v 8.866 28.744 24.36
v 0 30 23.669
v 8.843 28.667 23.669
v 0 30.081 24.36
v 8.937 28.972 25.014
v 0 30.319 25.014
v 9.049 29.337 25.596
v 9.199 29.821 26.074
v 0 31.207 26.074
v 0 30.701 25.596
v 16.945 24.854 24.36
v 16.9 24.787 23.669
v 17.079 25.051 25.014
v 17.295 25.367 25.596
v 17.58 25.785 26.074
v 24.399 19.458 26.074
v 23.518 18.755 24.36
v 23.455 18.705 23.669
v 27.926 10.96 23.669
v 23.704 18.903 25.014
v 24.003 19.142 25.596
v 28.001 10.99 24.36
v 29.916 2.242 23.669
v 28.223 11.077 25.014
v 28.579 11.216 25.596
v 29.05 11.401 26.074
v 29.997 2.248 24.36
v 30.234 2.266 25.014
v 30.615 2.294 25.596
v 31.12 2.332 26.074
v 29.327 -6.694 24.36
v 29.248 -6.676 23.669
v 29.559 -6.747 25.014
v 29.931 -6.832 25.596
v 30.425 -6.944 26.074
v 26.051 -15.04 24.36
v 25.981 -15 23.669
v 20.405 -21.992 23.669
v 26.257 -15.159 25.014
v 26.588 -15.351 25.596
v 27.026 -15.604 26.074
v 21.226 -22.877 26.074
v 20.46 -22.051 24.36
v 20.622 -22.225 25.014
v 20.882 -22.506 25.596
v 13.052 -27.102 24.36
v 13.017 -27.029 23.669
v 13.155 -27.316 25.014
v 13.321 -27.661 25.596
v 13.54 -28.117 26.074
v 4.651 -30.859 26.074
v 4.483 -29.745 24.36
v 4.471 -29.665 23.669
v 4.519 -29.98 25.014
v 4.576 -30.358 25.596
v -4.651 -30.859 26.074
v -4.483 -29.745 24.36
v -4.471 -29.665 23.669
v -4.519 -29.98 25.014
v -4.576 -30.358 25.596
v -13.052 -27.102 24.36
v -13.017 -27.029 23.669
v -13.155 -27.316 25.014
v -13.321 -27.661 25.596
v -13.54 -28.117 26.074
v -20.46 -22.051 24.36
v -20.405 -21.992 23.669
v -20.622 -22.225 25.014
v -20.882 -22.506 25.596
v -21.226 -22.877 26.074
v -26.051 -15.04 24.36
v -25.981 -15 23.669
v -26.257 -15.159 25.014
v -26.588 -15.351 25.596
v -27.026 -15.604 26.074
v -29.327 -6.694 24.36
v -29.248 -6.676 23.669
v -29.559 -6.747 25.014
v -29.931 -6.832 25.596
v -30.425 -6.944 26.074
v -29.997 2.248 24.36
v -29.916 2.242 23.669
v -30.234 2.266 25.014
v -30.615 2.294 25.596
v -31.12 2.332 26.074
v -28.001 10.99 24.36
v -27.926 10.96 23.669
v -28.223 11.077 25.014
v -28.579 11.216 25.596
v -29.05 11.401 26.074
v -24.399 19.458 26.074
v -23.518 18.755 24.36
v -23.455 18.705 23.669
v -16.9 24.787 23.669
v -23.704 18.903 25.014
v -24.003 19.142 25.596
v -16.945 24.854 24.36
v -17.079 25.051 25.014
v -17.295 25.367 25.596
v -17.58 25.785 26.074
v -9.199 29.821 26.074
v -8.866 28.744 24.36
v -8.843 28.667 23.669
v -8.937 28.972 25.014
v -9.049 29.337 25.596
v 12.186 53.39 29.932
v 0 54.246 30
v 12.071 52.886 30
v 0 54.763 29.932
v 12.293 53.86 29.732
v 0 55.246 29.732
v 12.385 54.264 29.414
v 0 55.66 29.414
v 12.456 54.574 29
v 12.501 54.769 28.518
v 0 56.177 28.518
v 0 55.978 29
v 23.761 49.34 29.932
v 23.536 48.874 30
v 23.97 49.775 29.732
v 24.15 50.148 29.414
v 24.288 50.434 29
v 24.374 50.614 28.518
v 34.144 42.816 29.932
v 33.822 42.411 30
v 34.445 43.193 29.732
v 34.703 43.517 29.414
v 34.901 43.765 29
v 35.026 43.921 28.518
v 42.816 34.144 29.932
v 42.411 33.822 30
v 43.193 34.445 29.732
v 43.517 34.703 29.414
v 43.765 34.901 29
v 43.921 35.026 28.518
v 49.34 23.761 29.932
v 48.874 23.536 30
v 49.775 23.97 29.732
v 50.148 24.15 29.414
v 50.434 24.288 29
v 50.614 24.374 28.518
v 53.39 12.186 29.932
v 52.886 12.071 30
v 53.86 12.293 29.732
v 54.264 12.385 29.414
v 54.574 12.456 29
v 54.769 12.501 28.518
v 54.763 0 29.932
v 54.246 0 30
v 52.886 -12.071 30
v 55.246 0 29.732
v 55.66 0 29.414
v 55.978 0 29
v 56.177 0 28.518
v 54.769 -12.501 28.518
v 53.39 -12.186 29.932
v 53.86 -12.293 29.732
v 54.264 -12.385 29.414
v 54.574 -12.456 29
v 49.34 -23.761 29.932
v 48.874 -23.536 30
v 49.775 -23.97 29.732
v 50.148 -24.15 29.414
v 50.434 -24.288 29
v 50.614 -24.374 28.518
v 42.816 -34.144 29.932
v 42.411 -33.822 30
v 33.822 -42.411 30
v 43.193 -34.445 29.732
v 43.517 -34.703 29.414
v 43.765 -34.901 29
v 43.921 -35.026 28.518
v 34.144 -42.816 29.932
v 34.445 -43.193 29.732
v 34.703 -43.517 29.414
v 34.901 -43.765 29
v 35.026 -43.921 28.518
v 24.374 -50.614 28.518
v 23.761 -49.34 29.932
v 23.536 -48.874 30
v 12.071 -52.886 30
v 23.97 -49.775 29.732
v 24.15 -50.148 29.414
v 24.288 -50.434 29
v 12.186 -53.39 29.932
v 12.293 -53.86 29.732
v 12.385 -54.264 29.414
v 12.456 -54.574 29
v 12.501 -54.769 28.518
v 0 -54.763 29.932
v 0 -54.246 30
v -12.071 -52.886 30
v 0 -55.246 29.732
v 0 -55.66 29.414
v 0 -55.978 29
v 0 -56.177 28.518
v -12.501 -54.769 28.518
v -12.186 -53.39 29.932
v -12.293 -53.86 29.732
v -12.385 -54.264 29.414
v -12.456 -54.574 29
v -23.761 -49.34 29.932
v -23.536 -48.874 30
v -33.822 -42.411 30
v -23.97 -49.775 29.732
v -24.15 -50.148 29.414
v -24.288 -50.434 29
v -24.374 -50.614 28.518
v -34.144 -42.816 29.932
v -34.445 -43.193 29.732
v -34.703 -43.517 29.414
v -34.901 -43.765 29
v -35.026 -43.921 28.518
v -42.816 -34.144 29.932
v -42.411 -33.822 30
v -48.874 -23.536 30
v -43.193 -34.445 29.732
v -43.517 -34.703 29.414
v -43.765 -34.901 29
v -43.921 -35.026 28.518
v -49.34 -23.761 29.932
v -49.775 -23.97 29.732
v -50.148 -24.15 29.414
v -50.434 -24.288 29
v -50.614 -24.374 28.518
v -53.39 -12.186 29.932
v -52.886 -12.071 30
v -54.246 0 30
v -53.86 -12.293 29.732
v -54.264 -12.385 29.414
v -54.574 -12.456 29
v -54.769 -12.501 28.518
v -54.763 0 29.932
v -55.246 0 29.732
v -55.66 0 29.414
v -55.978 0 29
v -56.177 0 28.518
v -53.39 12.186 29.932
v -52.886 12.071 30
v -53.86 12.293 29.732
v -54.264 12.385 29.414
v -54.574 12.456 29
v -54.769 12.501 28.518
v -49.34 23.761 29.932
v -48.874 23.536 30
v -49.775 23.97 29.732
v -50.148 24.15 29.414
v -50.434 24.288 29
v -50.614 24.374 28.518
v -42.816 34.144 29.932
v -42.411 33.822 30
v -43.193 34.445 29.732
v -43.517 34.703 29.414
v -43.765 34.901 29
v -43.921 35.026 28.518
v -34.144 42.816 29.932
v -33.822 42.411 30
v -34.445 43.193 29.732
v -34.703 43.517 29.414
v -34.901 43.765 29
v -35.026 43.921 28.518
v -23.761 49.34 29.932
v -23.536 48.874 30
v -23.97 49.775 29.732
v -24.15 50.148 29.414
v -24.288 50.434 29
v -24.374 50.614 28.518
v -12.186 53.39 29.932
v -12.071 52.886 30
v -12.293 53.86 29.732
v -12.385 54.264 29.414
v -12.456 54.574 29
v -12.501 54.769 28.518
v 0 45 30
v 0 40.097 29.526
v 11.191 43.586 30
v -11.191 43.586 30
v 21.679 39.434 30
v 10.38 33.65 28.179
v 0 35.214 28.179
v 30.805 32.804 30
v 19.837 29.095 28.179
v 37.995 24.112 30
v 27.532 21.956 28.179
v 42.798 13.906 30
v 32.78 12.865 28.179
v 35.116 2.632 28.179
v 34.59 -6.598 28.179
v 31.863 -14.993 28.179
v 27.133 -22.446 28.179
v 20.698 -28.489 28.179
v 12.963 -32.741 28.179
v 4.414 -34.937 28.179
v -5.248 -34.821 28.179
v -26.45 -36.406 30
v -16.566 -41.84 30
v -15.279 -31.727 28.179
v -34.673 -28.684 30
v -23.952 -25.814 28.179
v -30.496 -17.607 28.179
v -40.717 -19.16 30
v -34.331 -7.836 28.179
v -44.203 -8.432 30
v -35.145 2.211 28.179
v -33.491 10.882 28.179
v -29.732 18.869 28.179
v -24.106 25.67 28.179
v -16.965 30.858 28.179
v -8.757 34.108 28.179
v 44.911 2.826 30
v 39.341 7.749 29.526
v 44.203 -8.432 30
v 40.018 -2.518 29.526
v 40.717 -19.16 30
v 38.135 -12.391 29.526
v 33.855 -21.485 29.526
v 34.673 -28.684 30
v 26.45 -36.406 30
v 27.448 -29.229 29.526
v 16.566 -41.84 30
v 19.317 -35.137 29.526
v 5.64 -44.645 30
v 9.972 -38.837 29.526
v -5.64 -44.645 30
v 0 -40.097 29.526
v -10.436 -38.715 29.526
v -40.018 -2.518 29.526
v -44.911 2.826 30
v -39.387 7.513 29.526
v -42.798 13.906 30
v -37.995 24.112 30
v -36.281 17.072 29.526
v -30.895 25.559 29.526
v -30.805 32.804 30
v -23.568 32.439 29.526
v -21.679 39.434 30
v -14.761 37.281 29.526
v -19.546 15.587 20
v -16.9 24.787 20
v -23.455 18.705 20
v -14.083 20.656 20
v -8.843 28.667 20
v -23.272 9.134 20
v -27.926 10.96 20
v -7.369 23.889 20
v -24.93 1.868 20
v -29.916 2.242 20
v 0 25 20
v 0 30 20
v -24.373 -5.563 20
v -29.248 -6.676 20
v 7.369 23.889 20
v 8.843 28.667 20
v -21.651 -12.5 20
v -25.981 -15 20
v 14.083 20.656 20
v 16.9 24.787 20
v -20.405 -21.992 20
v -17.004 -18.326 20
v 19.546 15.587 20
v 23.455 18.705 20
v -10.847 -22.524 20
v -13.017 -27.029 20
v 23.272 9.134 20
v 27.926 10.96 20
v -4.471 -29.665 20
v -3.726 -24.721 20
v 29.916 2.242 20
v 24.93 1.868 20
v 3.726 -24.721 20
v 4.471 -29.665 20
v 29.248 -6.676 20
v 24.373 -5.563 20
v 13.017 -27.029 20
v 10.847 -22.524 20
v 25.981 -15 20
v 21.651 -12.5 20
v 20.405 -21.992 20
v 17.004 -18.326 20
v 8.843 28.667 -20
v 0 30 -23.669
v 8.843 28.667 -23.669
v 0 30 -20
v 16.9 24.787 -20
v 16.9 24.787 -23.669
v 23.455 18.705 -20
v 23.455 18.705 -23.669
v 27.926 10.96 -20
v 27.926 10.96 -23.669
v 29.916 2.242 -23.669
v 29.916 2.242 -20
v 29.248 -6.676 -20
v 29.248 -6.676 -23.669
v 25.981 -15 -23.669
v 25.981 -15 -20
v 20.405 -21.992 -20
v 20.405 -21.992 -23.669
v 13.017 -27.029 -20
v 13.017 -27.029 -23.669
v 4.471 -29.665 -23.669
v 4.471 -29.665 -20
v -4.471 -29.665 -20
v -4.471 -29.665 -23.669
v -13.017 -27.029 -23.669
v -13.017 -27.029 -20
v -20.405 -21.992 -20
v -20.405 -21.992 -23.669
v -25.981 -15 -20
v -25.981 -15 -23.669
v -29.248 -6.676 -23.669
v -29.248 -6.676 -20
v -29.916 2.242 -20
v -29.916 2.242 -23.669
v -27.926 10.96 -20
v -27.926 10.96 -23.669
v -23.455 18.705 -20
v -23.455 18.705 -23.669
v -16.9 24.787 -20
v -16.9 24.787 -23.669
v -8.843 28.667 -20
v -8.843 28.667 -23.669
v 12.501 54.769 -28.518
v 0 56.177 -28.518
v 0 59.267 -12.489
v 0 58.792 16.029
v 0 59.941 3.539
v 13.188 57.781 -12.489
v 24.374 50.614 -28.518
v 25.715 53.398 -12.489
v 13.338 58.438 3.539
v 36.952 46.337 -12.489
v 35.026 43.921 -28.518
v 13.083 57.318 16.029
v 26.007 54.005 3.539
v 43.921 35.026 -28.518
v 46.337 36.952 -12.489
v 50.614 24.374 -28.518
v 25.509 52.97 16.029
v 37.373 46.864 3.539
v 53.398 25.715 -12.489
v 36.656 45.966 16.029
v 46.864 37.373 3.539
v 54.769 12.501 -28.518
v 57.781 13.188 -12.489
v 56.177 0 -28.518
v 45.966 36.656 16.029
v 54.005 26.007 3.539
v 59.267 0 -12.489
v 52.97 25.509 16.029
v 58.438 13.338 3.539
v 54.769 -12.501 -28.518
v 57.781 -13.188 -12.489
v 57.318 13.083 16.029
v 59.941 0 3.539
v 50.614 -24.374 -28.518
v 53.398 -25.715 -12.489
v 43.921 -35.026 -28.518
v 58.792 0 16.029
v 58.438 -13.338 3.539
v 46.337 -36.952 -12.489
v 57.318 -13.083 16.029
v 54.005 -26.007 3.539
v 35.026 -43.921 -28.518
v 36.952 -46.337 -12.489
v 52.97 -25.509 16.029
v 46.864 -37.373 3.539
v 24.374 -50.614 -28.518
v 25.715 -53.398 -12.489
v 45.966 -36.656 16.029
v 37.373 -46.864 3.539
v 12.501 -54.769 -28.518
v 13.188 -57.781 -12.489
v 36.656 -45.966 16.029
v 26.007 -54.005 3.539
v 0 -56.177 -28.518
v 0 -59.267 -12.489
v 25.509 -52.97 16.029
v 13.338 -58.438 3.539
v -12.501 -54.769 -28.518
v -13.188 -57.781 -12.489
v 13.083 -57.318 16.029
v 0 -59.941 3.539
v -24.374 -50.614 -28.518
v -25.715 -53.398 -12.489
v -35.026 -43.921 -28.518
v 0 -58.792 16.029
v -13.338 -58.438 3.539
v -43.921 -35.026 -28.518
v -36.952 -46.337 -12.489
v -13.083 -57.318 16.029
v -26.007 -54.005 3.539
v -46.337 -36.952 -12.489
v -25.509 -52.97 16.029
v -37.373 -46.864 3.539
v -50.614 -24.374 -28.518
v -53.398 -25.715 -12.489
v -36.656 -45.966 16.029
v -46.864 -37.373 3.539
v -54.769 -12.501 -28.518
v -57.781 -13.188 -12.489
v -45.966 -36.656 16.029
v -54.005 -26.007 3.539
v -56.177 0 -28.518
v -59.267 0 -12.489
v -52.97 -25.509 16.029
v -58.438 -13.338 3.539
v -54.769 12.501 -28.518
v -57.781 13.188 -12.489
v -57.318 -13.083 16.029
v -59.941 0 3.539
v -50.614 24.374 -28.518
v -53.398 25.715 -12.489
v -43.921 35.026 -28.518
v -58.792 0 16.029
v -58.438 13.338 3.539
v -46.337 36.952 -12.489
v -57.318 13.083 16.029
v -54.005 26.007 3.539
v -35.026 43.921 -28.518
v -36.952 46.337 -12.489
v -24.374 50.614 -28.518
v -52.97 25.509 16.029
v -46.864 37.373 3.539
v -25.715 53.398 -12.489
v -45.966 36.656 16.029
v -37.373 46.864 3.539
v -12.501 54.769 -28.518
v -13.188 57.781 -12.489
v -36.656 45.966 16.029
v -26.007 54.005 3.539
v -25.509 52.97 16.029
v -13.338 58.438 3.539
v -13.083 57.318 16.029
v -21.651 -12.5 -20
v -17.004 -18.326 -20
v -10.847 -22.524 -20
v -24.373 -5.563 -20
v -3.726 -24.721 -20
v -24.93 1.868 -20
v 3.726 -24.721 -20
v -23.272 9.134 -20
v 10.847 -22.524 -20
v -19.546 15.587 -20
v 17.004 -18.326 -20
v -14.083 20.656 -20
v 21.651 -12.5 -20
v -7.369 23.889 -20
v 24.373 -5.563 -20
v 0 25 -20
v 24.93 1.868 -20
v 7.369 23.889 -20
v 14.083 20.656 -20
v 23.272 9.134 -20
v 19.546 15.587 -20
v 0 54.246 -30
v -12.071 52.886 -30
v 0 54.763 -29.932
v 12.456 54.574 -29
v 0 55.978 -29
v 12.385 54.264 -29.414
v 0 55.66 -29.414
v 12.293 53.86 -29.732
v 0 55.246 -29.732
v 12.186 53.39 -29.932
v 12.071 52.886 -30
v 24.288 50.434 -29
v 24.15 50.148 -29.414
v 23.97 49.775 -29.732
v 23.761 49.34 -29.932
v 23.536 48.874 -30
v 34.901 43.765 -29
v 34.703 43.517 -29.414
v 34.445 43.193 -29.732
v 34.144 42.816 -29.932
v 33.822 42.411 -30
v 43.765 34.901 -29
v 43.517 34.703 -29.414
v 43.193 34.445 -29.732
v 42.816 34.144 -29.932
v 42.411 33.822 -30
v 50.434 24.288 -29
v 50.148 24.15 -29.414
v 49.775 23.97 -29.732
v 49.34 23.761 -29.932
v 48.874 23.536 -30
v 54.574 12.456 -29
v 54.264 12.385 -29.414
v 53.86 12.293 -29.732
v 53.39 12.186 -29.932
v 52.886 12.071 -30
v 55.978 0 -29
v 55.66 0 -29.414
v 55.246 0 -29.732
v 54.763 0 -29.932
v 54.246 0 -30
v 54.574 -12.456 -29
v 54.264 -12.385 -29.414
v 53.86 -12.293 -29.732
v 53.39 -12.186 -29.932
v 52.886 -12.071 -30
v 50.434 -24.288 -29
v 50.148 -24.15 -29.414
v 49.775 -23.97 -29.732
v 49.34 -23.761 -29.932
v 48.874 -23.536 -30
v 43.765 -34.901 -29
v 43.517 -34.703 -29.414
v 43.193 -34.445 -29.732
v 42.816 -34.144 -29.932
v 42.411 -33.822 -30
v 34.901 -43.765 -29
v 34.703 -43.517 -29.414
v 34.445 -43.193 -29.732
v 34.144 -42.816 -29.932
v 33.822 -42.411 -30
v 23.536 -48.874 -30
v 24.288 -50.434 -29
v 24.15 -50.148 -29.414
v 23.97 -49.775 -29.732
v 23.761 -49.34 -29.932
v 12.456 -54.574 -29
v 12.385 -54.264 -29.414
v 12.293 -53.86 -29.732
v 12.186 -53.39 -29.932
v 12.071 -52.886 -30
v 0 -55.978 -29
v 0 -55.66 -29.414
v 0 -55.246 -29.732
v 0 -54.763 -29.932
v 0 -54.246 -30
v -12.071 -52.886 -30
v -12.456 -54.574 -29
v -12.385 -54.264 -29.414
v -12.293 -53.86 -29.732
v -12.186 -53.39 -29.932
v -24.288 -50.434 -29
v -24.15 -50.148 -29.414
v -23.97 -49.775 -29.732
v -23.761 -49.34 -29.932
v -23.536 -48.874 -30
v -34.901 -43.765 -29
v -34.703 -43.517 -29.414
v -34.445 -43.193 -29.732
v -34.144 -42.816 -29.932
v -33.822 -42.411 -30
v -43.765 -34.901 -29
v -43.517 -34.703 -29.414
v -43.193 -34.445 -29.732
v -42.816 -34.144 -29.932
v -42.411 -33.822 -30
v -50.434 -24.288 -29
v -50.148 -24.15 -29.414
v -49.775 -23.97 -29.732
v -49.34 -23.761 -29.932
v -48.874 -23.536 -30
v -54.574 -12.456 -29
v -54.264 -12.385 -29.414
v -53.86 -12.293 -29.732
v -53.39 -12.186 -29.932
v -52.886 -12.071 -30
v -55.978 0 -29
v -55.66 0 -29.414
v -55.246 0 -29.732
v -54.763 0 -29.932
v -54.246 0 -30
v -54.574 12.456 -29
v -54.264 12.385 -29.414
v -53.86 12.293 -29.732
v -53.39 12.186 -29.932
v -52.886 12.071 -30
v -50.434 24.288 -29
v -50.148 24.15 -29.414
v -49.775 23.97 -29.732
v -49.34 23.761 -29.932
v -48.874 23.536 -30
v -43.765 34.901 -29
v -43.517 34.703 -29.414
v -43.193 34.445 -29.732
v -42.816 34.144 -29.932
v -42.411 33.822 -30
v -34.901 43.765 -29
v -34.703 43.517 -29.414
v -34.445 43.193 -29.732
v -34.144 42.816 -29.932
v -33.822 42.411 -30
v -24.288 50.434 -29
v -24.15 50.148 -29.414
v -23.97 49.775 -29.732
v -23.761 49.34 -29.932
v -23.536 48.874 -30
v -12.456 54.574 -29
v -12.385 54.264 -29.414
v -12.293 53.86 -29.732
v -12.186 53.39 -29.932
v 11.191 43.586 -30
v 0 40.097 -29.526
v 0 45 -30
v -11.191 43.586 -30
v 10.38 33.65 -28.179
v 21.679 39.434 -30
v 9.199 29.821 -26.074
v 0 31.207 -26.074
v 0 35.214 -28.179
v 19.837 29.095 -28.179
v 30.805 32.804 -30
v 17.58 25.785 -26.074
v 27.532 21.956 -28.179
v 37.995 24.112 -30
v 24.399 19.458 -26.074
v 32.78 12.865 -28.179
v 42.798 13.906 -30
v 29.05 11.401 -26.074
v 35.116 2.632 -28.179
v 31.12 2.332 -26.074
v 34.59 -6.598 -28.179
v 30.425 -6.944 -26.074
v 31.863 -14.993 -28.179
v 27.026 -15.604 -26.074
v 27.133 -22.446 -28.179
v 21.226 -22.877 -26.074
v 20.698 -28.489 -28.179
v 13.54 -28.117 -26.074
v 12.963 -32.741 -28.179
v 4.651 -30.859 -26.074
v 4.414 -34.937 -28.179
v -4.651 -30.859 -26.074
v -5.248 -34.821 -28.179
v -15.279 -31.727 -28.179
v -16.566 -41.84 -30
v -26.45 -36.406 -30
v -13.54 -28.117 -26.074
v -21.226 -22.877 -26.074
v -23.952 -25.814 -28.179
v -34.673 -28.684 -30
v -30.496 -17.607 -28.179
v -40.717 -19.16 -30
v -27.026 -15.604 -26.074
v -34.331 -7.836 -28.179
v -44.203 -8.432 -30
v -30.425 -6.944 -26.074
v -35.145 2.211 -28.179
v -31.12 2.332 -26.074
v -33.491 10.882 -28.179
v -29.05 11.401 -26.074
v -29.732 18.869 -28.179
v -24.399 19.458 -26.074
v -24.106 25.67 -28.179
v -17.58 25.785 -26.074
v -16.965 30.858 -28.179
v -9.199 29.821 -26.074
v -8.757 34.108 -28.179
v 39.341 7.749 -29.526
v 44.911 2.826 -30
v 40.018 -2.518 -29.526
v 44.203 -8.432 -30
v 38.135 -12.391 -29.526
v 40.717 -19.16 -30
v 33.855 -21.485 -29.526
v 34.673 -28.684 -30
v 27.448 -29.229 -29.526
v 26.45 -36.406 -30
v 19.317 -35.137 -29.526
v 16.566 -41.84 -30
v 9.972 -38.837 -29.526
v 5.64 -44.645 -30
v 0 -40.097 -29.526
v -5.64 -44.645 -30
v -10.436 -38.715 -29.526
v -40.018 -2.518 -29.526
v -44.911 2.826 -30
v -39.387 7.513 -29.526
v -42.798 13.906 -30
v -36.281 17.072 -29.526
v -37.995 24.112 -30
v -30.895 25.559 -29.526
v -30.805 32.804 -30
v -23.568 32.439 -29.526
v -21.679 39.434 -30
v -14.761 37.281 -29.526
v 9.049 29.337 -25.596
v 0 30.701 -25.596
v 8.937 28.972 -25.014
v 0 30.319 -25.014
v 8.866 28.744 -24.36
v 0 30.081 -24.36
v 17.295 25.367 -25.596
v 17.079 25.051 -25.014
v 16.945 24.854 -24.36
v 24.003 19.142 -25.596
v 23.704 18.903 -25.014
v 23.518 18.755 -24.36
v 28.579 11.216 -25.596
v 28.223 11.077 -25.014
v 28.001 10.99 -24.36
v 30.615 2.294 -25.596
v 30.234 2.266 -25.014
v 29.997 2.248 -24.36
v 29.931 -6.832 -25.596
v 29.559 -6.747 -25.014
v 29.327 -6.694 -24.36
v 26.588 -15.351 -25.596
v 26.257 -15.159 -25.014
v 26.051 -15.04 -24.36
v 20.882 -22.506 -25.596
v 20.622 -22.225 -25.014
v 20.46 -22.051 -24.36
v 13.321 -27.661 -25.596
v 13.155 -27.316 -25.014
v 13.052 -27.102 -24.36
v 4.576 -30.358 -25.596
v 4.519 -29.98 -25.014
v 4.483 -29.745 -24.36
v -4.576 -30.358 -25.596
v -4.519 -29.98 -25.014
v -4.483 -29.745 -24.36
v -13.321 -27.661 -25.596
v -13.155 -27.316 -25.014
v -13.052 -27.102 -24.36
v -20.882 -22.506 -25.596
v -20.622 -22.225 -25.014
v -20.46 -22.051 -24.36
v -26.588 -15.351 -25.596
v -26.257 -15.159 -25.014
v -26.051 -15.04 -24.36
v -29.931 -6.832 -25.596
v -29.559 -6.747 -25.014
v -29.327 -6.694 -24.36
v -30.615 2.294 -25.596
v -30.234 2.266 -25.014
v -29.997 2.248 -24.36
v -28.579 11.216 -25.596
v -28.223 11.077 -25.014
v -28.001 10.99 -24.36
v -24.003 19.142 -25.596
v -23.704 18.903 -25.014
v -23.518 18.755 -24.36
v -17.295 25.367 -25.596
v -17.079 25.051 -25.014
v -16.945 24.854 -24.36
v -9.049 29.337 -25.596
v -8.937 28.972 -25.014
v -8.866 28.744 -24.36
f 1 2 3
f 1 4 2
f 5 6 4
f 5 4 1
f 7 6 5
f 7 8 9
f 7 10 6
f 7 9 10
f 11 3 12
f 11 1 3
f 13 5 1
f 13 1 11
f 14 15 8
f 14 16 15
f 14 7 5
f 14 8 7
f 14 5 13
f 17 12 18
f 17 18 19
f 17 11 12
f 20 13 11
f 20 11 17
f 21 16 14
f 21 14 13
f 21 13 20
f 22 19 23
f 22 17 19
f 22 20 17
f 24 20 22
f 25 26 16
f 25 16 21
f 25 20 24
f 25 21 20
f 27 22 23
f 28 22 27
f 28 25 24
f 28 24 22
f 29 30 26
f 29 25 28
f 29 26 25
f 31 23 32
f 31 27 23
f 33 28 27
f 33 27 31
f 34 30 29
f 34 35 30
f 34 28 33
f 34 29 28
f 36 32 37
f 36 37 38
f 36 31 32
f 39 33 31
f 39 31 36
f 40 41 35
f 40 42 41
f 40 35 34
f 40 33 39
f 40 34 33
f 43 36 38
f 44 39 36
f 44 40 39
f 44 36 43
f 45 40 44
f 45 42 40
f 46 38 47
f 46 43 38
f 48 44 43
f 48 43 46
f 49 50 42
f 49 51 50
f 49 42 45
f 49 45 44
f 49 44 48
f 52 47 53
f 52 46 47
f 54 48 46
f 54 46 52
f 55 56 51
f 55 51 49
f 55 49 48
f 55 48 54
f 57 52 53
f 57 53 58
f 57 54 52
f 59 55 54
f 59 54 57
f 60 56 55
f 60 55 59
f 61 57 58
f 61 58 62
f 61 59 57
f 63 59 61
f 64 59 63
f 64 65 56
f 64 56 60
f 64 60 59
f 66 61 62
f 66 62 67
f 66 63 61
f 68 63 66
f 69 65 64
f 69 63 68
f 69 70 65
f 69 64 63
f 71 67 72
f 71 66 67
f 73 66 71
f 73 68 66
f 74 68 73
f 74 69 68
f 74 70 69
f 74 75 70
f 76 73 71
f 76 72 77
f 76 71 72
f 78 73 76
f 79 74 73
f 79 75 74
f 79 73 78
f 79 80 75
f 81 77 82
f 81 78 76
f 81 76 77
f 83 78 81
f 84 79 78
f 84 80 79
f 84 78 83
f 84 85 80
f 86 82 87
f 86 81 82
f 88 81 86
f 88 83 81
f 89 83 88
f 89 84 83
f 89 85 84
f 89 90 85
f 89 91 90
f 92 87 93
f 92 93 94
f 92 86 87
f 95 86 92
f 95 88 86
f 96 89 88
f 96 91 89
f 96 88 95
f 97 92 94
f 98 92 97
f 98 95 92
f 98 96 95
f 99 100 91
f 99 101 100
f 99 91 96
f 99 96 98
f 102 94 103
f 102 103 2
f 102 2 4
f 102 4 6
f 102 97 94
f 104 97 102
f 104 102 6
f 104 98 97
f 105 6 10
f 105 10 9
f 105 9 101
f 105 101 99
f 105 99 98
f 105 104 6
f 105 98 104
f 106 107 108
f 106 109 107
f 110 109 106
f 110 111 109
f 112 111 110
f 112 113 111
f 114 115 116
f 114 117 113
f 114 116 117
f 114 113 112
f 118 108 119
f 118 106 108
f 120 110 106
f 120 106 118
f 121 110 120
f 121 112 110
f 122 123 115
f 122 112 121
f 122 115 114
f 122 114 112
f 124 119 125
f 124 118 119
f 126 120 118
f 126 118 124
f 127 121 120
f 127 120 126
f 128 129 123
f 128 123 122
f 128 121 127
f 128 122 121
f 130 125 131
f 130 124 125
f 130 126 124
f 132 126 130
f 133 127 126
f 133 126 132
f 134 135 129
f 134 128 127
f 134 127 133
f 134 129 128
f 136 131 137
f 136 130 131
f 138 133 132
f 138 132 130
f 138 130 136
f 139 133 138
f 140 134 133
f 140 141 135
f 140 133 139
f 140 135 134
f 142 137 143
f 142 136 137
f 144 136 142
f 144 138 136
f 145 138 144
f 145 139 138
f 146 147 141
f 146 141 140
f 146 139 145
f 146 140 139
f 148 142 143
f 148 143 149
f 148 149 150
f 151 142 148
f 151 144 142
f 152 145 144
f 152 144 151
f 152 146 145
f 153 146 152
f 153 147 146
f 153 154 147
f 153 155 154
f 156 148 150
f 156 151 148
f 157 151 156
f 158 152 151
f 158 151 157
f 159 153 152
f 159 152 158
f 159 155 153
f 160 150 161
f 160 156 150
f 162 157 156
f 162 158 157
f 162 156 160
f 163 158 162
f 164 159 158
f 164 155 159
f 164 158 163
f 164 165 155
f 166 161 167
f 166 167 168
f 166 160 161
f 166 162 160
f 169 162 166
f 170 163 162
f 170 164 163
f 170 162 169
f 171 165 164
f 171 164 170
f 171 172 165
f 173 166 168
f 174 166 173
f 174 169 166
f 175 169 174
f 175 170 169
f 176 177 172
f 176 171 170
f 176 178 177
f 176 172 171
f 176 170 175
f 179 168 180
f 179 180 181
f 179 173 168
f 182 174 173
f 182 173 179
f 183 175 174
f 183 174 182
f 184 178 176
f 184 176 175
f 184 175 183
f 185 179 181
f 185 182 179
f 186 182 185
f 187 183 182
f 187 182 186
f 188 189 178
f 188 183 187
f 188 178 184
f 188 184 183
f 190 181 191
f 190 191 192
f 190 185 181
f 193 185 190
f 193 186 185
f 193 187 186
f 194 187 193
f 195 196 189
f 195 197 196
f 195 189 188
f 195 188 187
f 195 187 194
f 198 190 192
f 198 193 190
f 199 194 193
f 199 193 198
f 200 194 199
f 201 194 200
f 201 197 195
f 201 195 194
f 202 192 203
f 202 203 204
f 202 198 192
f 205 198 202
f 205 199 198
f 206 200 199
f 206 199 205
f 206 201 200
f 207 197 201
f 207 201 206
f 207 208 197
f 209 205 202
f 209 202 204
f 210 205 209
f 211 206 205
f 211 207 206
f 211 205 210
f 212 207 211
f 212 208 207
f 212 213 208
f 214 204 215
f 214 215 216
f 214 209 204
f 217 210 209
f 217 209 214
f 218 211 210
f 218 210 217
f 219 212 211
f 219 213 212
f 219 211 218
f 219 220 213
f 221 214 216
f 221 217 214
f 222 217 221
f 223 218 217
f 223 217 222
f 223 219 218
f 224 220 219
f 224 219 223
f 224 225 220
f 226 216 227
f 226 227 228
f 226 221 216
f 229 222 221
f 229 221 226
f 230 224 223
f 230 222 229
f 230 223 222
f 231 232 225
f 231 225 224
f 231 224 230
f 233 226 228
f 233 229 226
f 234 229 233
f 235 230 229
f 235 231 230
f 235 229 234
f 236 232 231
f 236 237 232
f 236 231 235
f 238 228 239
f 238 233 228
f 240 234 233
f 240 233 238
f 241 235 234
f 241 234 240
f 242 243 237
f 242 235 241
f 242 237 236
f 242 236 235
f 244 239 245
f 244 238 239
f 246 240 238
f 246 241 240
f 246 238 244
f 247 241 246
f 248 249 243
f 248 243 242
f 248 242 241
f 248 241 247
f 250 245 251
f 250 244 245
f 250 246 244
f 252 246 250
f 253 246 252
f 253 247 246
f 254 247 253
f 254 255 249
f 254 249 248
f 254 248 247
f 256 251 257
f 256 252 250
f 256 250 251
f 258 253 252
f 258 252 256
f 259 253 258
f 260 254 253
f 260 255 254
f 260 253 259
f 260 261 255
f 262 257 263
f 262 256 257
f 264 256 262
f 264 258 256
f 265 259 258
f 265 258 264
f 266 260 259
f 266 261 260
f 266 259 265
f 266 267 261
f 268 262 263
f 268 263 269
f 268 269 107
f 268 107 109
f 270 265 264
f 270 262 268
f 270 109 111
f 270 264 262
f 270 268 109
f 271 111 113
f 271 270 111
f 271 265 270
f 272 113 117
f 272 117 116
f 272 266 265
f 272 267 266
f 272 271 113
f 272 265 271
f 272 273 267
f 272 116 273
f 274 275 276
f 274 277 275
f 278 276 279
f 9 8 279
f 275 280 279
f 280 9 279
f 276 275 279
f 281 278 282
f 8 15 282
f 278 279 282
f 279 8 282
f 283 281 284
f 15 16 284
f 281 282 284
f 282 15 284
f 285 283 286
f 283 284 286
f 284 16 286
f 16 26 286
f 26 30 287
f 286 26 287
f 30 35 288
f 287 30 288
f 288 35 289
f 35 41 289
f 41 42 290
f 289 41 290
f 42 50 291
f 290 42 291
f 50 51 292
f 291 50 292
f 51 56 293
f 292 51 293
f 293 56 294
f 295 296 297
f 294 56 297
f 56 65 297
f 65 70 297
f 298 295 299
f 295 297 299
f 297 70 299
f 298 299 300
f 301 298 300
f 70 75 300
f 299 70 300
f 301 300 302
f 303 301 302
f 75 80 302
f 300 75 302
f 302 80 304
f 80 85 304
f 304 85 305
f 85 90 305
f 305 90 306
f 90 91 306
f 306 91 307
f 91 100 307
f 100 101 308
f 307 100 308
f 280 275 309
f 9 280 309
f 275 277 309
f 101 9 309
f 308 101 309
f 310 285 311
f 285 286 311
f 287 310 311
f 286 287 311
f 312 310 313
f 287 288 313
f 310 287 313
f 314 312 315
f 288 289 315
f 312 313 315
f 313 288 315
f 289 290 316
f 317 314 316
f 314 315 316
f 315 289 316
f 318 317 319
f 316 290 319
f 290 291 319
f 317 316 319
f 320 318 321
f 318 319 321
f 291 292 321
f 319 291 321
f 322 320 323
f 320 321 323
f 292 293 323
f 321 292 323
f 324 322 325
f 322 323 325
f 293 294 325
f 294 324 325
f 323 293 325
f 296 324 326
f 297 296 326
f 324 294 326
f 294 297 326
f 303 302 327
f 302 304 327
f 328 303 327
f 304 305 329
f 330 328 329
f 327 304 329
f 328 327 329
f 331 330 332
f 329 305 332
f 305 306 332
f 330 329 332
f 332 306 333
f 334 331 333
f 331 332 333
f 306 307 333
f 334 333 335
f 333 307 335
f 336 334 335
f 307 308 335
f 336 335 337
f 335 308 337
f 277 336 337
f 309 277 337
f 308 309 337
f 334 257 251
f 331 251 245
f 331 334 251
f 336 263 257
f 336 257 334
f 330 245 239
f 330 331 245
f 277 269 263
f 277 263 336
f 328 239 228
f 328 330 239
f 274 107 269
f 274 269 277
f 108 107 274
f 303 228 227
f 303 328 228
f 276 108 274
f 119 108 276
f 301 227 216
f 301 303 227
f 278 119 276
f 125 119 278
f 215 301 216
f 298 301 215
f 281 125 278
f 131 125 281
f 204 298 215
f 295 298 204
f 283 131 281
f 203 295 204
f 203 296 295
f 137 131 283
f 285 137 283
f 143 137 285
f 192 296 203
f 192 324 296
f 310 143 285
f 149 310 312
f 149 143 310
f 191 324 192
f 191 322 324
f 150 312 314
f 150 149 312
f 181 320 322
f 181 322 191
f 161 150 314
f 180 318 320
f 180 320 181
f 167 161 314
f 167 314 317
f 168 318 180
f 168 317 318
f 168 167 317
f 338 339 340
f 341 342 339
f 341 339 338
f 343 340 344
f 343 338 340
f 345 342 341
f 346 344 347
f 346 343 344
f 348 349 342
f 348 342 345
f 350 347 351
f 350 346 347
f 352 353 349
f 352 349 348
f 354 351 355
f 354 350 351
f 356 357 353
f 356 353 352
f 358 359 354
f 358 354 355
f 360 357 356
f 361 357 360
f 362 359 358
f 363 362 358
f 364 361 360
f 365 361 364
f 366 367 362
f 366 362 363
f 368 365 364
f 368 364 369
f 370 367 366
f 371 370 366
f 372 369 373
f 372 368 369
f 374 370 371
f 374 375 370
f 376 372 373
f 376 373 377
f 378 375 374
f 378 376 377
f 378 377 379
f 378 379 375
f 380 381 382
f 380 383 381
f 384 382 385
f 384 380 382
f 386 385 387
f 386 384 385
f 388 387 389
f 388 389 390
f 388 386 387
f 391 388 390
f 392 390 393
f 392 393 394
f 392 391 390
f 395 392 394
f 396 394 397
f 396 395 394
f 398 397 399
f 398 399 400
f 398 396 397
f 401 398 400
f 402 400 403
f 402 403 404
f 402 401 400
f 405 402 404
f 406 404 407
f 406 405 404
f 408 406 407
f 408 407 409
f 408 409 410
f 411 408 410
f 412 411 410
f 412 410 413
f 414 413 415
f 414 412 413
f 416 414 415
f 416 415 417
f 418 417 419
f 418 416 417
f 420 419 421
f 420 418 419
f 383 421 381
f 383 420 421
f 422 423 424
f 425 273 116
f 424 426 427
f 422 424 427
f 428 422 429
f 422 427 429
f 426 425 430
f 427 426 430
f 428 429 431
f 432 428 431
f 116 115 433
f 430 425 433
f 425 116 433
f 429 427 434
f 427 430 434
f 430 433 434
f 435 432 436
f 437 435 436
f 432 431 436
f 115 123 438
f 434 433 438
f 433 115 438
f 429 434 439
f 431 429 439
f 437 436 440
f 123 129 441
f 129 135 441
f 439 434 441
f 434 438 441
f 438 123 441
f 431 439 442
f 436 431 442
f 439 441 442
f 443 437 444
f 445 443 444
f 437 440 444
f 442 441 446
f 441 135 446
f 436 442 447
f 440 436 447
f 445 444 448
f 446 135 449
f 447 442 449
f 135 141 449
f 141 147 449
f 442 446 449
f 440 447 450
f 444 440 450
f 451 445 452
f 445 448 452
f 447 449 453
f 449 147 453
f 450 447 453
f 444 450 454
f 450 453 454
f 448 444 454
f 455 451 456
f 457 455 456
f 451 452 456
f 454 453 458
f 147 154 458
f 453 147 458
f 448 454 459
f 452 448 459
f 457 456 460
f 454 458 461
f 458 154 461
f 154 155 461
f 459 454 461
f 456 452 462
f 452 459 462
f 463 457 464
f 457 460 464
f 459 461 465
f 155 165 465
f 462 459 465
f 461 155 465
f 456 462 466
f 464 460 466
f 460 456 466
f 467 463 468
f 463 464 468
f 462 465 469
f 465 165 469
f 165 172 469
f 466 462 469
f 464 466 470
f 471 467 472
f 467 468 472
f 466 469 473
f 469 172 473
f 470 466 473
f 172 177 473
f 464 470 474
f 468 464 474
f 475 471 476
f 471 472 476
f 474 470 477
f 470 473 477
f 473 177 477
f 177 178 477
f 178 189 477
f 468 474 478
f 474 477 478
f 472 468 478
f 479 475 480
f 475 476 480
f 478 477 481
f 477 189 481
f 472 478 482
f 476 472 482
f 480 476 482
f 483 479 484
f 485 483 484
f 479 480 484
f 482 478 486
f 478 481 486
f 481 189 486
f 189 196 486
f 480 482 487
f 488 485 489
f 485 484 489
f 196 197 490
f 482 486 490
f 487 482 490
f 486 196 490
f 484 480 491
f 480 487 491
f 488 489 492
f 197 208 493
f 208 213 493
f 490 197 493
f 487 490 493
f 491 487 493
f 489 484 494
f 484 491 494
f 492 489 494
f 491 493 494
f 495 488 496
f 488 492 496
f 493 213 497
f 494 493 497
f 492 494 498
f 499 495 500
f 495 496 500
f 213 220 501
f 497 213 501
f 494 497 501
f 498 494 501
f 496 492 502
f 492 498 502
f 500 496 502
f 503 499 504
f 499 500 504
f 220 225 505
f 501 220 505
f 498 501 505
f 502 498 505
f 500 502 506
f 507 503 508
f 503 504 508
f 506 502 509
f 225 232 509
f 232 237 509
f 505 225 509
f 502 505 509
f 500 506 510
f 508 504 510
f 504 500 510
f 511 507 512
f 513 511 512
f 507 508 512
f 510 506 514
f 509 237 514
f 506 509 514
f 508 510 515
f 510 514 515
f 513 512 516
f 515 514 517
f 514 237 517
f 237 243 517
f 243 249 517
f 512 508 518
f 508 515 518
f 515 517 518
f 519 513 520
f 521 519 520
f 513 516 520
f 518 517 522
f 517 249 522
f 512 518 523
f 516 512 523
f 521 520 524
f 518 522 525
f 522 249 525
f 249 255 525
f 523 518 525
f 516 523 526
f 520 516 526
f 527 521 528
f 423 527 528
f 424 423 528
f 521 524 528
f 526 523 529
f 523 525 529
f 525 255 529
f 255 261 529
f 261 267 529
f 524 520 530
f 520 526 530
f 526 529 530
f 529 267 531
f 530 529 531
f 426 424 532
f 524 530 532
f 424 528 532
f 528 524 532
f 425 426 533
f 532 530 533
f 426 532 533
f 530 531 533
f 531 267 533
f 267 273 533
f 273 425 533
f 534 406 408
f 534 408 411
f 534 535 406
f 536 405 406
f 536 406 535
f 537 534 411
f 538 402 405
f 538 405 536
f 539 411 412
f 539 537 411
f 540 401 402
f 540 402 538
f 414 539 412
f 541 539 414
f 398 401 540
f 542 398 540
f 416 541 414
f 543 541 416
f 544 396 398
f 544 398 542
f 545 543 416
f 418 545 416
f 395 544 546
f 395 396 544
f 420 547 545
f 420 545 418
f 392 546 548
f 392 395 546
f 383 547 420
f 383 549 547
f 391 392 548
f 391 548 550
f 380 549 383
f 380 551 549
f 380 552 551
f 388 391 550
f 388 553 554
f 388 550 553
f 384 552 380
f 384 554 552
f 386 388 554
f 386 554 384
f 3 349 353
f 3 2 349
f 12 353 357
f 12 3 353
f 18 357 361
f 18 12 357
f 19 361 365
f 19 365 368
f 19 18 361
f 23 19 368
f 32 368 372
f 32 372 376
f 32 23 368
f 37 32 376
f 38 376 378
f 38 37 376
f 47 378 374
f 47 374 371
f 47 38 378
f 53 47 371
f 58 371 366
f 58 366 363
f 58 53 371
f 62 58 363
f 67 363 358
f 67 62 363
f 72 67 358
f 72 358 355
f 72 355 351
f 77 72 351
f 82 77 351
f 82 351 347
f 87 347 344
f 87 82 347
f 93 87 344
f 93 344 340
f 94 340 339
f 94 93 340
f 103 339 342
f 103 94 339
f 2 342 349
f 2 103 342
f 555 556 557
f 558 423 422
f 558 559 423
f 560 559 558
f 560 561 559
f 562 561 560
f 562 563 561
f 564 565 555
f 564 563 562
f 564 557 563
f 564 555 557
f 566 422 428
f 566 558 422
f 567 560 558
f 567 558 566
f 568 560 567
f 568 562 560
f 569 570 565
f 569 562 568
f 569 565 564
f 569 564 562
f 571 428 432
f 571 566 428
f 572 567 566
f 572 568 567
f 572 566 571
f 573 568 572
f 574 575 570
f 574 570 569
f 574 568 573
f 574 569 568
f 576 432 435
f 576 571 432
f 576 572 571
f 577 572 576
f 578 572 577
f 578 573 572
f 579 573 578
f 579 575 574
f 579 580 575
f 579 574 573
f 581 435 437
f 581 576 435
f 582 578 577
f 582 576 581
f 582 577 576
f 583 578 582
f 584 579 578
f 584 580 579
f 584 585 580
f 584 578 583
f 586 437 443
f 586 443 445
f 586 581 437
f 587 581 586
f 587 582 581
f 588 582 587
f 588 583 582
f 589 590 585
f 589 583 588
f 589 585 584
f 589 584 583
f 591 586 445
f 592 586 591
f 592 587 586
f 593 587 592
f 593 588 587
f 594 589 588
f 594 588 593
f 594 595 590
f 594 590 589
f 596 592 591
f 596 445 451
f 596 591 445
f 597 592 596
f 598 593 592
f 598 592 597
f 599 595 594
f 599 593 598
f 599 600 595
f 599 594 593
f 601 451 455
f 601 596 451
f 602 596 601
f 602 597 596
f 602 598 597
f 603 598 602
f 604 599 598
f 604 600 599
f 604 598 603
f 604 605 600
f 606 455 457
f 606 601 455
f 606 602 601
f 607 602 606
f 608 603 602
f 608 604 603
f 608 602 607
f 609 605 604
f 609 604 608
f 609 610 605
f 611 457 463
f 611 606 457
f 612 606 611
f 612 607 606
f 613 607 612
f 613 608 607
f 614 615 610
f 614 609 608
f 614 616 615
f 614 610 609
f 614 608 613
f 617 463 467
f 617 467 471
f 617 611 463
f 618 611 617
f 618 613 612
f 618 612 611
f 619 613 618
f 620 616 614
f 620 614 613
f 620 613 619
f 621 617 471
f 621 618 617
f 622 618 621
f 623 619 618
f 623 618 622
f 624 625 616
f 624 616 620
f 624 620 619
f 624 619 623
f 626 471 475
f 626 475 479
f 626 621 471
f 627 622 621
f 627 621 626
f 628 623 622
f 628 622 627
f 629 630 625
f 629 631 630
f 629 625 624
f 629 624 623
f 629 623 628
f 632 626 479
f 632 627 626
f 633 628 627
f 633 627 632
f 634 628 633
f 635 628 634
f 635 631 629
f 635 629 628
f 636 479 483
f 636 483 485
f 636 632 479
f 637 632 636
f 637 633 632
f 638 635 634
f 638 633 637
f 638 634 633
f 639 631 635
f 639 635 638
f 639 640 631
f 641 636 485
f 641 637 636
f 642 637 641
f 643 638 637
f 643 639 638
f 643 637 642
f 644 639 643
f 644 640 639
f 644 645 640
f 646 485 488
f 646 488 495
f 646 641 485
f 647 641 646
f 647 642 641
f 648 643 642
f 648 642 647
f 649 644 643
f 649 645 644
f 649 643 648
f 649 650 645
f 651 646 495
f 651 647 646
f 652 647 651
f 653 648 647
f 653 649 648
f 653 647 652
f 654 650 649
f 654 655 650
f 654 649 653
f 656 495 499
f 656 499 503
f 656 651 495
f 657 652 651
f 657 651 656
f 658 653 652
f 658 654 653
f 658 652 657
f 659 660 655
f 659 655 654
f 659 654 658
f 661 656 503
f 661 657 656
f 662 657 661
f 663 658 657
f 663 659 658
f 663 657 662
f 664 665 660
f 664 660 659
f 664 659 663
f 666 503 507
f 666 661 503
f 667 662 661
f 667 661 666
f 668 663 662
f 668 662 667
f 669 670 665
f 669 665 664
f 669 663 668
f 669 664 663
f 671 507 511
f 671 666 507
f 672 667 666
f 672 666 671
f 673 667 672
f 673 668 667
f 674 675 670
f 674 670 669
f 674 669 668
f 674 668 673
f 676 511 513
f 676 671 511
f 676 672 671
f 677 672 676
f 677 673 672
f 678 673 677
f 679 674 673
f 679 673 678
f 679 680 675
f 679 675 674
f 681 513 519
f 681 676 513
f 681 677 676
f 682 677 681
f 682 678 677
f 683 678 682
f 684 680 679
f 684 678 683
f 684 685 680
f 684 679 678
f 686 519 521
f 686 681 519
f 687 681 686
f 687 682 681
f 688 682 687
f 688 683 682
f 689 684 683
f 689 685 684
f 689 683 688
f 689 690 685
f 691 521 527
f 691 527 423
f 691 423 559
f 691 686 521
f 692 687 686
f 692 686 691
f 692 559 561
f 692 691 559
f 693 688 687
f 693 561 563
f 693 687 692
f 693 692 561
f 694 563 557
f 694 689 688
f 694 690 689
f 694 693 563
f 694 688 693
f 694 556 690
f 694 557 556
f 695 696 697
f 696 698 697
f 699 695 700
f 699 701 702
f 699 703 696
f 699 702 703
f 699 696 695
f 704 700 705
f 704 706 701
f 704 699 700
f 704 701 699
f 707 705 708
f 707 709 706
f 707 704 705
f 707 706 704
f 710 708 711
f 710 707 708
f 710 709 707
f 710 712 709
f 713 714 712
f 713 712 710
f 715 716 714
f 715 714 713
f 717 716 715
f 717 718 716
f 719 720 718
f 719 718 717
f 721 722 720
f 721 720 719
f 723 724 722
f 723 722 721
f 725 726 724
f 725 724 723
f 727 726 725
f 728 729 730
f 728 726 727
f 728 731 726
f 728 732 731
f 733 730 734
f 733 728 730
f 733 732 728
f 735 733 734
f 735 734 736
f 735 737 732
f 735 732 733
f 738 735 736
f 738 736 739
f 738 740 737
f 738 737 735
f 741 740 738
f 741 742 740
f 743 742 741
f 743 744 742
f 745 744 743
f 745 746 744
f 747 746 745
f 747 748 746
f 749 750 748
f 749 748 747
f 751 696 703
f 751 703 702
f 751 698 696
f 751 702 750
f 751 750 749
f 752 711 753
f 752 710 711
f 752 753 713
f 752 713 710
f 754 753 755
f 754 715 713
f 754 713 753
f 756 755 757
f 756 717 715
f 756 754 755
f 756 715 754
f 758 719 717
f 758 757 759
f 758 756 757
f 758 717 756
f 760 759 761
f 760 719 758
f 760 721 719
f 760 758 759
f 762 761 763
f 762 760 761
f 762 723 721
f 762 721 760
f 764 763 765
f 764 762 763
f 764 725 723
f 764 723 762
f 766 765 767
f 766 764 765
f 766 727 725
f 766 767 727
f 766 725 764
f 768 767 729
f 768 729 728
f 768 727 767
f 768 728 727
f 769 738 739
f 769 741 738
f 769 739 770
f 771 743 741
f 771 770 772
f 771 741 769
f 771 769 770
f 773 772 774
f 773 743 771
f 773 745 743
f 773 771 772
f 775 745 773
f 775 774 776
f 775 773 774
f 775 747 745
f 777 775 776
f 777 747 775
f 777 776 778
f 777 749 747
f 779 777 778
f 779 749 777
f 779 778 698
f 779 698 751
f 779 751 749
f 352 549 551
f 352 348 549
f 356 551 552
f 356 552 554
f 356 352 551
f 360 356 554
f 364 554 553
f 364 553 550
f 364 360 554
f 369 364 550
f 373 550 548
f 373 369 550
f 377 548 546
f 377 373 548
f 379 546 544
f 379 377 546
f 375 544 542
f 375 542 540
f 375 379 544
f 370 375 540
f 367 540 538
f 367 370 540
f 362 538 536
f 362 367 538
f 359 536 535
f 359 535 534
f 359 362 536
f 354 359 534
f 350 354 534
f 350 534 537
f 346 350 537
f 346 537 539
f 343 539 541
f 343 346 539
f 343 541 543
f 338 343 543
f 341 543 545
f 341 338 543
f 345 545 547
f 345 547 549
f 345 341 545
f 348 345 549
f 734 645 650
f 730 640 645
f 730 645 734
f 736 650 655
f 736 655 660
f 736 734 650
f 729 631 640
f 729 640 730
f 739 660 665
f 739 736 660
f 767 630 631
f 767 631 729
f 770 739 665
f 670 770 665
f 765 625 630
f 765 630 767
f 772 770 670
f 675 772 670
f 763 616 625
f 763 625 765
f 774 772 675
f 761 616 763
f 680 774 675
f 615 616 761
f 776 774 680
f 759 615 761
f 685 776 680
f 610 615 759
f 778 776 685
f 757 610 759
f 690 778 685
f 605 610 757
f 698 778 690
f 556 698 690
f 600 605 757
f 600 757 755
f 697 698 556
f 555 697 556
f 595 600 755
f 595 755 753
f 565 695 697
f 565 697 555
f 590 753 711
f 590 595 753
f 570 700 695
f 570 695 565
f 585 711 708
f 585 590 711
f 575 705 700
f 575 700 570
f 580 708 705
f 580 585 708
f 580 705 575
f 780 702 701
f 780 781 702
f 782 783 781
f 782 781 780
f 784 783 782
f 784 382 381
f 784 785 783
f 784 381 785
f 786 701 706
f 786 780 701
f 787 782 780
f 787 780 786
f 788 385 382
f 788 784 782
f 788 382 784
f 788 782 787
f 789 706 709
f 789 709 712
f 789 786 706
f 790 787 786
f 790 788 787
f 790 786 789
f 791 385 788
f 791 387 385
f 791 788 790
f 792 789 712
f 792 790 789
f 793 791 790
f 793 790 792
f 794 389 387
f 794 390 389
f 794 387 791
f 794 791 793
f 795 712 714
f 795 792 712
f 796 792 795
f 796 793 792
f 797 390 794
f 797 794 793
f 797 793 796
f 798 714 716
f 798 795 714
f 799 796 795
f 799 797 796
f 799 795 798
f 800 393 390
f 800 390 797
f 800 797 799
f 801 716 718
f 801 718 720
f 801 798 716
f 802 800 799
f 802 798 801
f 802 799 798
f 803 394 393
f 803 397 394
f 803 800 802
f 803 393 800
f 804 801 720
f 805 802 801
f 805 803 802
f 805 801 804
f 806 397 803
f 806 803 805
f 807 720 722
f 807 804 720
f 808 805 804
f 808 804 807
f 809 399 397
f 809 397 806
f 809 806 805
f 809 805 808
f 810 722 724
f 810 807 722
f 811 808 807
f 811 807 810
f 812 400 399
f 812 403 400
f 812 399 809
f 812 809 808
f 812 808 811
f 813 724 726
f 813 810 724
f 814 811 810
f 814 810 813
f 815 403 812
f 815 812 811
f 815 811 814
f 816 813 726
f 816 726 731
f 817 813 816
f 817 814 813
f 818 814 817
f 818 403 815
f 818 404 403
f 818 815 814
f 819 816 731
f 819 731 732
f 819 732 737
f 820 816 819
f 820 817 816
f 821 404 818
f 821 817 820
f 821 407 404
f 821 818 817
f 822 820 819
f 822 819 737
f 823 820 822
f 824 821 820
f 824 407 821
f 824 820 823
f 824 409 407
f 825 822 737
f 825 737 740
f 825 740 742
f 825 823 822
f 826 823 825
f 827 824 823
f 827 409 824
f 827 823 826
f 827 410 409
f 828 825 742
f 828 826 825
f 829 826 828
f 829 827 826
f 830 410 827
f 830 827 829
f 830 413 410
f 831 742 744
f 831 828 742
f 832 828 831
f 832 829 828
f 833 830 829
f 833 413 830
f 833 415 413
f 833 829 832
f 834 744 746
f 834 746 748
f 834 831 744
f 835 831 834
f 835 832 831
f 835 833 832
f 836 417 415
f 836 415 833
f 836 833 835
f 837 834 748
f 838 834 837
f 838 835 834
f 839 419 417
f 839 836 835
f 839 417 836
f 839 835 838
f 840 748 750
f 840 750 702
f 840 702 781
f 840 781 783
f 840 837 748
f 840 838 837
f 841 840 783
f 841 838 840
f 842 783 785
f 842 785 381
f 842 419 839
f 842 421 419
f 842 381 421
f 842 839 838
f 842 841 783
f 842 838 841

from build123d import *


with BuildPart() as part:
    # Sketch1 → Revolve1 (revolve)
    with BuildSketch(Plane(origin=(0, 0, 0), x_dir=(0, 0, -1), z_dir=(1, 0, 0))):
        with BuildLine():
            Line((20, 25), (-20, 25))
            Line((-20, 25), (-20, 30))
            Line((-20, 30), (-23.668508033, 30))
            ThreePointArc((-23.668508033, 30), (-25.014325105, 30.318810635), (-26.074101646, 31.207482393))
            add(Edge.make_bspline(
                [(-30, 45), (-30, 42.68615593), (-29.260358377, 37.431599739), (-27.2974092, 32.849185005), (-26.074101646, 31.207482393)],
                knots=[0, 0, 0, 0, 0.439021045, 0.878042089, 0.878042089, 0.878042089, 0.878042089], degree=3))
            Line((-30, 45), (-30, 54.245621199))
            ThreePointArc((-30, 54.245621199), (-29.586783181, 55.463044353), (-28.517880862, 56.177407784))
            add(Edge.make_bspline(
                [(-28.517880862, 56.177407784), (-23.764900718, 57.45160519), (-14.258940431, 59.362901297), (-4.752980144, 60), (0, 60)],
                knots=[0.024701986, 0.024701986, 0.024701986, 0.024701986, 0.262350993, 0.5, 0.5, 0.5, 0.5], degree=3))
            add(Edge.make_bspline(
                [(28.517880862, 56.177407784), (23.764900718, 57.45160519), (14.258940431, 59.362901297), (4.752980144, 60), (0, 60)],
                knots=[0.024701986, 0.024701986, 0.024701986, 0.024701986, 0.262350993, 0.5, 0.5, 0.5, 0.5], degree=3))
            ThreePointArc((28.517880862, 56.177407784), (29.586783181, 55.463044353), (30, 54.245621199))
            Line((30, 54.245621199), (30, 45))
            add(Edge.make_bspline(
                [(30, 45), (30, 42.68615593), (29.260358377, 37.431599739), (27.2974092, 32.849185005), (26.074101646, 31.207482393)],
                knots=[0, 0, 0, 0, 0.439021045, 0.878042089, 0.878042089, 0.878042089, 0.878042089], degree=3))
            ThreePointArc((26.074101646, 31.207482393), (25.014325105, 30.318810635), (23.668508033, 30))
            Line((23.668508033, 30), (20, 30))
            Line((20, 30), (20, 25))
        make_face()
    revolve(axis=Axis((0, 0, 30), (0, 0, -1)))


solid = part.part
